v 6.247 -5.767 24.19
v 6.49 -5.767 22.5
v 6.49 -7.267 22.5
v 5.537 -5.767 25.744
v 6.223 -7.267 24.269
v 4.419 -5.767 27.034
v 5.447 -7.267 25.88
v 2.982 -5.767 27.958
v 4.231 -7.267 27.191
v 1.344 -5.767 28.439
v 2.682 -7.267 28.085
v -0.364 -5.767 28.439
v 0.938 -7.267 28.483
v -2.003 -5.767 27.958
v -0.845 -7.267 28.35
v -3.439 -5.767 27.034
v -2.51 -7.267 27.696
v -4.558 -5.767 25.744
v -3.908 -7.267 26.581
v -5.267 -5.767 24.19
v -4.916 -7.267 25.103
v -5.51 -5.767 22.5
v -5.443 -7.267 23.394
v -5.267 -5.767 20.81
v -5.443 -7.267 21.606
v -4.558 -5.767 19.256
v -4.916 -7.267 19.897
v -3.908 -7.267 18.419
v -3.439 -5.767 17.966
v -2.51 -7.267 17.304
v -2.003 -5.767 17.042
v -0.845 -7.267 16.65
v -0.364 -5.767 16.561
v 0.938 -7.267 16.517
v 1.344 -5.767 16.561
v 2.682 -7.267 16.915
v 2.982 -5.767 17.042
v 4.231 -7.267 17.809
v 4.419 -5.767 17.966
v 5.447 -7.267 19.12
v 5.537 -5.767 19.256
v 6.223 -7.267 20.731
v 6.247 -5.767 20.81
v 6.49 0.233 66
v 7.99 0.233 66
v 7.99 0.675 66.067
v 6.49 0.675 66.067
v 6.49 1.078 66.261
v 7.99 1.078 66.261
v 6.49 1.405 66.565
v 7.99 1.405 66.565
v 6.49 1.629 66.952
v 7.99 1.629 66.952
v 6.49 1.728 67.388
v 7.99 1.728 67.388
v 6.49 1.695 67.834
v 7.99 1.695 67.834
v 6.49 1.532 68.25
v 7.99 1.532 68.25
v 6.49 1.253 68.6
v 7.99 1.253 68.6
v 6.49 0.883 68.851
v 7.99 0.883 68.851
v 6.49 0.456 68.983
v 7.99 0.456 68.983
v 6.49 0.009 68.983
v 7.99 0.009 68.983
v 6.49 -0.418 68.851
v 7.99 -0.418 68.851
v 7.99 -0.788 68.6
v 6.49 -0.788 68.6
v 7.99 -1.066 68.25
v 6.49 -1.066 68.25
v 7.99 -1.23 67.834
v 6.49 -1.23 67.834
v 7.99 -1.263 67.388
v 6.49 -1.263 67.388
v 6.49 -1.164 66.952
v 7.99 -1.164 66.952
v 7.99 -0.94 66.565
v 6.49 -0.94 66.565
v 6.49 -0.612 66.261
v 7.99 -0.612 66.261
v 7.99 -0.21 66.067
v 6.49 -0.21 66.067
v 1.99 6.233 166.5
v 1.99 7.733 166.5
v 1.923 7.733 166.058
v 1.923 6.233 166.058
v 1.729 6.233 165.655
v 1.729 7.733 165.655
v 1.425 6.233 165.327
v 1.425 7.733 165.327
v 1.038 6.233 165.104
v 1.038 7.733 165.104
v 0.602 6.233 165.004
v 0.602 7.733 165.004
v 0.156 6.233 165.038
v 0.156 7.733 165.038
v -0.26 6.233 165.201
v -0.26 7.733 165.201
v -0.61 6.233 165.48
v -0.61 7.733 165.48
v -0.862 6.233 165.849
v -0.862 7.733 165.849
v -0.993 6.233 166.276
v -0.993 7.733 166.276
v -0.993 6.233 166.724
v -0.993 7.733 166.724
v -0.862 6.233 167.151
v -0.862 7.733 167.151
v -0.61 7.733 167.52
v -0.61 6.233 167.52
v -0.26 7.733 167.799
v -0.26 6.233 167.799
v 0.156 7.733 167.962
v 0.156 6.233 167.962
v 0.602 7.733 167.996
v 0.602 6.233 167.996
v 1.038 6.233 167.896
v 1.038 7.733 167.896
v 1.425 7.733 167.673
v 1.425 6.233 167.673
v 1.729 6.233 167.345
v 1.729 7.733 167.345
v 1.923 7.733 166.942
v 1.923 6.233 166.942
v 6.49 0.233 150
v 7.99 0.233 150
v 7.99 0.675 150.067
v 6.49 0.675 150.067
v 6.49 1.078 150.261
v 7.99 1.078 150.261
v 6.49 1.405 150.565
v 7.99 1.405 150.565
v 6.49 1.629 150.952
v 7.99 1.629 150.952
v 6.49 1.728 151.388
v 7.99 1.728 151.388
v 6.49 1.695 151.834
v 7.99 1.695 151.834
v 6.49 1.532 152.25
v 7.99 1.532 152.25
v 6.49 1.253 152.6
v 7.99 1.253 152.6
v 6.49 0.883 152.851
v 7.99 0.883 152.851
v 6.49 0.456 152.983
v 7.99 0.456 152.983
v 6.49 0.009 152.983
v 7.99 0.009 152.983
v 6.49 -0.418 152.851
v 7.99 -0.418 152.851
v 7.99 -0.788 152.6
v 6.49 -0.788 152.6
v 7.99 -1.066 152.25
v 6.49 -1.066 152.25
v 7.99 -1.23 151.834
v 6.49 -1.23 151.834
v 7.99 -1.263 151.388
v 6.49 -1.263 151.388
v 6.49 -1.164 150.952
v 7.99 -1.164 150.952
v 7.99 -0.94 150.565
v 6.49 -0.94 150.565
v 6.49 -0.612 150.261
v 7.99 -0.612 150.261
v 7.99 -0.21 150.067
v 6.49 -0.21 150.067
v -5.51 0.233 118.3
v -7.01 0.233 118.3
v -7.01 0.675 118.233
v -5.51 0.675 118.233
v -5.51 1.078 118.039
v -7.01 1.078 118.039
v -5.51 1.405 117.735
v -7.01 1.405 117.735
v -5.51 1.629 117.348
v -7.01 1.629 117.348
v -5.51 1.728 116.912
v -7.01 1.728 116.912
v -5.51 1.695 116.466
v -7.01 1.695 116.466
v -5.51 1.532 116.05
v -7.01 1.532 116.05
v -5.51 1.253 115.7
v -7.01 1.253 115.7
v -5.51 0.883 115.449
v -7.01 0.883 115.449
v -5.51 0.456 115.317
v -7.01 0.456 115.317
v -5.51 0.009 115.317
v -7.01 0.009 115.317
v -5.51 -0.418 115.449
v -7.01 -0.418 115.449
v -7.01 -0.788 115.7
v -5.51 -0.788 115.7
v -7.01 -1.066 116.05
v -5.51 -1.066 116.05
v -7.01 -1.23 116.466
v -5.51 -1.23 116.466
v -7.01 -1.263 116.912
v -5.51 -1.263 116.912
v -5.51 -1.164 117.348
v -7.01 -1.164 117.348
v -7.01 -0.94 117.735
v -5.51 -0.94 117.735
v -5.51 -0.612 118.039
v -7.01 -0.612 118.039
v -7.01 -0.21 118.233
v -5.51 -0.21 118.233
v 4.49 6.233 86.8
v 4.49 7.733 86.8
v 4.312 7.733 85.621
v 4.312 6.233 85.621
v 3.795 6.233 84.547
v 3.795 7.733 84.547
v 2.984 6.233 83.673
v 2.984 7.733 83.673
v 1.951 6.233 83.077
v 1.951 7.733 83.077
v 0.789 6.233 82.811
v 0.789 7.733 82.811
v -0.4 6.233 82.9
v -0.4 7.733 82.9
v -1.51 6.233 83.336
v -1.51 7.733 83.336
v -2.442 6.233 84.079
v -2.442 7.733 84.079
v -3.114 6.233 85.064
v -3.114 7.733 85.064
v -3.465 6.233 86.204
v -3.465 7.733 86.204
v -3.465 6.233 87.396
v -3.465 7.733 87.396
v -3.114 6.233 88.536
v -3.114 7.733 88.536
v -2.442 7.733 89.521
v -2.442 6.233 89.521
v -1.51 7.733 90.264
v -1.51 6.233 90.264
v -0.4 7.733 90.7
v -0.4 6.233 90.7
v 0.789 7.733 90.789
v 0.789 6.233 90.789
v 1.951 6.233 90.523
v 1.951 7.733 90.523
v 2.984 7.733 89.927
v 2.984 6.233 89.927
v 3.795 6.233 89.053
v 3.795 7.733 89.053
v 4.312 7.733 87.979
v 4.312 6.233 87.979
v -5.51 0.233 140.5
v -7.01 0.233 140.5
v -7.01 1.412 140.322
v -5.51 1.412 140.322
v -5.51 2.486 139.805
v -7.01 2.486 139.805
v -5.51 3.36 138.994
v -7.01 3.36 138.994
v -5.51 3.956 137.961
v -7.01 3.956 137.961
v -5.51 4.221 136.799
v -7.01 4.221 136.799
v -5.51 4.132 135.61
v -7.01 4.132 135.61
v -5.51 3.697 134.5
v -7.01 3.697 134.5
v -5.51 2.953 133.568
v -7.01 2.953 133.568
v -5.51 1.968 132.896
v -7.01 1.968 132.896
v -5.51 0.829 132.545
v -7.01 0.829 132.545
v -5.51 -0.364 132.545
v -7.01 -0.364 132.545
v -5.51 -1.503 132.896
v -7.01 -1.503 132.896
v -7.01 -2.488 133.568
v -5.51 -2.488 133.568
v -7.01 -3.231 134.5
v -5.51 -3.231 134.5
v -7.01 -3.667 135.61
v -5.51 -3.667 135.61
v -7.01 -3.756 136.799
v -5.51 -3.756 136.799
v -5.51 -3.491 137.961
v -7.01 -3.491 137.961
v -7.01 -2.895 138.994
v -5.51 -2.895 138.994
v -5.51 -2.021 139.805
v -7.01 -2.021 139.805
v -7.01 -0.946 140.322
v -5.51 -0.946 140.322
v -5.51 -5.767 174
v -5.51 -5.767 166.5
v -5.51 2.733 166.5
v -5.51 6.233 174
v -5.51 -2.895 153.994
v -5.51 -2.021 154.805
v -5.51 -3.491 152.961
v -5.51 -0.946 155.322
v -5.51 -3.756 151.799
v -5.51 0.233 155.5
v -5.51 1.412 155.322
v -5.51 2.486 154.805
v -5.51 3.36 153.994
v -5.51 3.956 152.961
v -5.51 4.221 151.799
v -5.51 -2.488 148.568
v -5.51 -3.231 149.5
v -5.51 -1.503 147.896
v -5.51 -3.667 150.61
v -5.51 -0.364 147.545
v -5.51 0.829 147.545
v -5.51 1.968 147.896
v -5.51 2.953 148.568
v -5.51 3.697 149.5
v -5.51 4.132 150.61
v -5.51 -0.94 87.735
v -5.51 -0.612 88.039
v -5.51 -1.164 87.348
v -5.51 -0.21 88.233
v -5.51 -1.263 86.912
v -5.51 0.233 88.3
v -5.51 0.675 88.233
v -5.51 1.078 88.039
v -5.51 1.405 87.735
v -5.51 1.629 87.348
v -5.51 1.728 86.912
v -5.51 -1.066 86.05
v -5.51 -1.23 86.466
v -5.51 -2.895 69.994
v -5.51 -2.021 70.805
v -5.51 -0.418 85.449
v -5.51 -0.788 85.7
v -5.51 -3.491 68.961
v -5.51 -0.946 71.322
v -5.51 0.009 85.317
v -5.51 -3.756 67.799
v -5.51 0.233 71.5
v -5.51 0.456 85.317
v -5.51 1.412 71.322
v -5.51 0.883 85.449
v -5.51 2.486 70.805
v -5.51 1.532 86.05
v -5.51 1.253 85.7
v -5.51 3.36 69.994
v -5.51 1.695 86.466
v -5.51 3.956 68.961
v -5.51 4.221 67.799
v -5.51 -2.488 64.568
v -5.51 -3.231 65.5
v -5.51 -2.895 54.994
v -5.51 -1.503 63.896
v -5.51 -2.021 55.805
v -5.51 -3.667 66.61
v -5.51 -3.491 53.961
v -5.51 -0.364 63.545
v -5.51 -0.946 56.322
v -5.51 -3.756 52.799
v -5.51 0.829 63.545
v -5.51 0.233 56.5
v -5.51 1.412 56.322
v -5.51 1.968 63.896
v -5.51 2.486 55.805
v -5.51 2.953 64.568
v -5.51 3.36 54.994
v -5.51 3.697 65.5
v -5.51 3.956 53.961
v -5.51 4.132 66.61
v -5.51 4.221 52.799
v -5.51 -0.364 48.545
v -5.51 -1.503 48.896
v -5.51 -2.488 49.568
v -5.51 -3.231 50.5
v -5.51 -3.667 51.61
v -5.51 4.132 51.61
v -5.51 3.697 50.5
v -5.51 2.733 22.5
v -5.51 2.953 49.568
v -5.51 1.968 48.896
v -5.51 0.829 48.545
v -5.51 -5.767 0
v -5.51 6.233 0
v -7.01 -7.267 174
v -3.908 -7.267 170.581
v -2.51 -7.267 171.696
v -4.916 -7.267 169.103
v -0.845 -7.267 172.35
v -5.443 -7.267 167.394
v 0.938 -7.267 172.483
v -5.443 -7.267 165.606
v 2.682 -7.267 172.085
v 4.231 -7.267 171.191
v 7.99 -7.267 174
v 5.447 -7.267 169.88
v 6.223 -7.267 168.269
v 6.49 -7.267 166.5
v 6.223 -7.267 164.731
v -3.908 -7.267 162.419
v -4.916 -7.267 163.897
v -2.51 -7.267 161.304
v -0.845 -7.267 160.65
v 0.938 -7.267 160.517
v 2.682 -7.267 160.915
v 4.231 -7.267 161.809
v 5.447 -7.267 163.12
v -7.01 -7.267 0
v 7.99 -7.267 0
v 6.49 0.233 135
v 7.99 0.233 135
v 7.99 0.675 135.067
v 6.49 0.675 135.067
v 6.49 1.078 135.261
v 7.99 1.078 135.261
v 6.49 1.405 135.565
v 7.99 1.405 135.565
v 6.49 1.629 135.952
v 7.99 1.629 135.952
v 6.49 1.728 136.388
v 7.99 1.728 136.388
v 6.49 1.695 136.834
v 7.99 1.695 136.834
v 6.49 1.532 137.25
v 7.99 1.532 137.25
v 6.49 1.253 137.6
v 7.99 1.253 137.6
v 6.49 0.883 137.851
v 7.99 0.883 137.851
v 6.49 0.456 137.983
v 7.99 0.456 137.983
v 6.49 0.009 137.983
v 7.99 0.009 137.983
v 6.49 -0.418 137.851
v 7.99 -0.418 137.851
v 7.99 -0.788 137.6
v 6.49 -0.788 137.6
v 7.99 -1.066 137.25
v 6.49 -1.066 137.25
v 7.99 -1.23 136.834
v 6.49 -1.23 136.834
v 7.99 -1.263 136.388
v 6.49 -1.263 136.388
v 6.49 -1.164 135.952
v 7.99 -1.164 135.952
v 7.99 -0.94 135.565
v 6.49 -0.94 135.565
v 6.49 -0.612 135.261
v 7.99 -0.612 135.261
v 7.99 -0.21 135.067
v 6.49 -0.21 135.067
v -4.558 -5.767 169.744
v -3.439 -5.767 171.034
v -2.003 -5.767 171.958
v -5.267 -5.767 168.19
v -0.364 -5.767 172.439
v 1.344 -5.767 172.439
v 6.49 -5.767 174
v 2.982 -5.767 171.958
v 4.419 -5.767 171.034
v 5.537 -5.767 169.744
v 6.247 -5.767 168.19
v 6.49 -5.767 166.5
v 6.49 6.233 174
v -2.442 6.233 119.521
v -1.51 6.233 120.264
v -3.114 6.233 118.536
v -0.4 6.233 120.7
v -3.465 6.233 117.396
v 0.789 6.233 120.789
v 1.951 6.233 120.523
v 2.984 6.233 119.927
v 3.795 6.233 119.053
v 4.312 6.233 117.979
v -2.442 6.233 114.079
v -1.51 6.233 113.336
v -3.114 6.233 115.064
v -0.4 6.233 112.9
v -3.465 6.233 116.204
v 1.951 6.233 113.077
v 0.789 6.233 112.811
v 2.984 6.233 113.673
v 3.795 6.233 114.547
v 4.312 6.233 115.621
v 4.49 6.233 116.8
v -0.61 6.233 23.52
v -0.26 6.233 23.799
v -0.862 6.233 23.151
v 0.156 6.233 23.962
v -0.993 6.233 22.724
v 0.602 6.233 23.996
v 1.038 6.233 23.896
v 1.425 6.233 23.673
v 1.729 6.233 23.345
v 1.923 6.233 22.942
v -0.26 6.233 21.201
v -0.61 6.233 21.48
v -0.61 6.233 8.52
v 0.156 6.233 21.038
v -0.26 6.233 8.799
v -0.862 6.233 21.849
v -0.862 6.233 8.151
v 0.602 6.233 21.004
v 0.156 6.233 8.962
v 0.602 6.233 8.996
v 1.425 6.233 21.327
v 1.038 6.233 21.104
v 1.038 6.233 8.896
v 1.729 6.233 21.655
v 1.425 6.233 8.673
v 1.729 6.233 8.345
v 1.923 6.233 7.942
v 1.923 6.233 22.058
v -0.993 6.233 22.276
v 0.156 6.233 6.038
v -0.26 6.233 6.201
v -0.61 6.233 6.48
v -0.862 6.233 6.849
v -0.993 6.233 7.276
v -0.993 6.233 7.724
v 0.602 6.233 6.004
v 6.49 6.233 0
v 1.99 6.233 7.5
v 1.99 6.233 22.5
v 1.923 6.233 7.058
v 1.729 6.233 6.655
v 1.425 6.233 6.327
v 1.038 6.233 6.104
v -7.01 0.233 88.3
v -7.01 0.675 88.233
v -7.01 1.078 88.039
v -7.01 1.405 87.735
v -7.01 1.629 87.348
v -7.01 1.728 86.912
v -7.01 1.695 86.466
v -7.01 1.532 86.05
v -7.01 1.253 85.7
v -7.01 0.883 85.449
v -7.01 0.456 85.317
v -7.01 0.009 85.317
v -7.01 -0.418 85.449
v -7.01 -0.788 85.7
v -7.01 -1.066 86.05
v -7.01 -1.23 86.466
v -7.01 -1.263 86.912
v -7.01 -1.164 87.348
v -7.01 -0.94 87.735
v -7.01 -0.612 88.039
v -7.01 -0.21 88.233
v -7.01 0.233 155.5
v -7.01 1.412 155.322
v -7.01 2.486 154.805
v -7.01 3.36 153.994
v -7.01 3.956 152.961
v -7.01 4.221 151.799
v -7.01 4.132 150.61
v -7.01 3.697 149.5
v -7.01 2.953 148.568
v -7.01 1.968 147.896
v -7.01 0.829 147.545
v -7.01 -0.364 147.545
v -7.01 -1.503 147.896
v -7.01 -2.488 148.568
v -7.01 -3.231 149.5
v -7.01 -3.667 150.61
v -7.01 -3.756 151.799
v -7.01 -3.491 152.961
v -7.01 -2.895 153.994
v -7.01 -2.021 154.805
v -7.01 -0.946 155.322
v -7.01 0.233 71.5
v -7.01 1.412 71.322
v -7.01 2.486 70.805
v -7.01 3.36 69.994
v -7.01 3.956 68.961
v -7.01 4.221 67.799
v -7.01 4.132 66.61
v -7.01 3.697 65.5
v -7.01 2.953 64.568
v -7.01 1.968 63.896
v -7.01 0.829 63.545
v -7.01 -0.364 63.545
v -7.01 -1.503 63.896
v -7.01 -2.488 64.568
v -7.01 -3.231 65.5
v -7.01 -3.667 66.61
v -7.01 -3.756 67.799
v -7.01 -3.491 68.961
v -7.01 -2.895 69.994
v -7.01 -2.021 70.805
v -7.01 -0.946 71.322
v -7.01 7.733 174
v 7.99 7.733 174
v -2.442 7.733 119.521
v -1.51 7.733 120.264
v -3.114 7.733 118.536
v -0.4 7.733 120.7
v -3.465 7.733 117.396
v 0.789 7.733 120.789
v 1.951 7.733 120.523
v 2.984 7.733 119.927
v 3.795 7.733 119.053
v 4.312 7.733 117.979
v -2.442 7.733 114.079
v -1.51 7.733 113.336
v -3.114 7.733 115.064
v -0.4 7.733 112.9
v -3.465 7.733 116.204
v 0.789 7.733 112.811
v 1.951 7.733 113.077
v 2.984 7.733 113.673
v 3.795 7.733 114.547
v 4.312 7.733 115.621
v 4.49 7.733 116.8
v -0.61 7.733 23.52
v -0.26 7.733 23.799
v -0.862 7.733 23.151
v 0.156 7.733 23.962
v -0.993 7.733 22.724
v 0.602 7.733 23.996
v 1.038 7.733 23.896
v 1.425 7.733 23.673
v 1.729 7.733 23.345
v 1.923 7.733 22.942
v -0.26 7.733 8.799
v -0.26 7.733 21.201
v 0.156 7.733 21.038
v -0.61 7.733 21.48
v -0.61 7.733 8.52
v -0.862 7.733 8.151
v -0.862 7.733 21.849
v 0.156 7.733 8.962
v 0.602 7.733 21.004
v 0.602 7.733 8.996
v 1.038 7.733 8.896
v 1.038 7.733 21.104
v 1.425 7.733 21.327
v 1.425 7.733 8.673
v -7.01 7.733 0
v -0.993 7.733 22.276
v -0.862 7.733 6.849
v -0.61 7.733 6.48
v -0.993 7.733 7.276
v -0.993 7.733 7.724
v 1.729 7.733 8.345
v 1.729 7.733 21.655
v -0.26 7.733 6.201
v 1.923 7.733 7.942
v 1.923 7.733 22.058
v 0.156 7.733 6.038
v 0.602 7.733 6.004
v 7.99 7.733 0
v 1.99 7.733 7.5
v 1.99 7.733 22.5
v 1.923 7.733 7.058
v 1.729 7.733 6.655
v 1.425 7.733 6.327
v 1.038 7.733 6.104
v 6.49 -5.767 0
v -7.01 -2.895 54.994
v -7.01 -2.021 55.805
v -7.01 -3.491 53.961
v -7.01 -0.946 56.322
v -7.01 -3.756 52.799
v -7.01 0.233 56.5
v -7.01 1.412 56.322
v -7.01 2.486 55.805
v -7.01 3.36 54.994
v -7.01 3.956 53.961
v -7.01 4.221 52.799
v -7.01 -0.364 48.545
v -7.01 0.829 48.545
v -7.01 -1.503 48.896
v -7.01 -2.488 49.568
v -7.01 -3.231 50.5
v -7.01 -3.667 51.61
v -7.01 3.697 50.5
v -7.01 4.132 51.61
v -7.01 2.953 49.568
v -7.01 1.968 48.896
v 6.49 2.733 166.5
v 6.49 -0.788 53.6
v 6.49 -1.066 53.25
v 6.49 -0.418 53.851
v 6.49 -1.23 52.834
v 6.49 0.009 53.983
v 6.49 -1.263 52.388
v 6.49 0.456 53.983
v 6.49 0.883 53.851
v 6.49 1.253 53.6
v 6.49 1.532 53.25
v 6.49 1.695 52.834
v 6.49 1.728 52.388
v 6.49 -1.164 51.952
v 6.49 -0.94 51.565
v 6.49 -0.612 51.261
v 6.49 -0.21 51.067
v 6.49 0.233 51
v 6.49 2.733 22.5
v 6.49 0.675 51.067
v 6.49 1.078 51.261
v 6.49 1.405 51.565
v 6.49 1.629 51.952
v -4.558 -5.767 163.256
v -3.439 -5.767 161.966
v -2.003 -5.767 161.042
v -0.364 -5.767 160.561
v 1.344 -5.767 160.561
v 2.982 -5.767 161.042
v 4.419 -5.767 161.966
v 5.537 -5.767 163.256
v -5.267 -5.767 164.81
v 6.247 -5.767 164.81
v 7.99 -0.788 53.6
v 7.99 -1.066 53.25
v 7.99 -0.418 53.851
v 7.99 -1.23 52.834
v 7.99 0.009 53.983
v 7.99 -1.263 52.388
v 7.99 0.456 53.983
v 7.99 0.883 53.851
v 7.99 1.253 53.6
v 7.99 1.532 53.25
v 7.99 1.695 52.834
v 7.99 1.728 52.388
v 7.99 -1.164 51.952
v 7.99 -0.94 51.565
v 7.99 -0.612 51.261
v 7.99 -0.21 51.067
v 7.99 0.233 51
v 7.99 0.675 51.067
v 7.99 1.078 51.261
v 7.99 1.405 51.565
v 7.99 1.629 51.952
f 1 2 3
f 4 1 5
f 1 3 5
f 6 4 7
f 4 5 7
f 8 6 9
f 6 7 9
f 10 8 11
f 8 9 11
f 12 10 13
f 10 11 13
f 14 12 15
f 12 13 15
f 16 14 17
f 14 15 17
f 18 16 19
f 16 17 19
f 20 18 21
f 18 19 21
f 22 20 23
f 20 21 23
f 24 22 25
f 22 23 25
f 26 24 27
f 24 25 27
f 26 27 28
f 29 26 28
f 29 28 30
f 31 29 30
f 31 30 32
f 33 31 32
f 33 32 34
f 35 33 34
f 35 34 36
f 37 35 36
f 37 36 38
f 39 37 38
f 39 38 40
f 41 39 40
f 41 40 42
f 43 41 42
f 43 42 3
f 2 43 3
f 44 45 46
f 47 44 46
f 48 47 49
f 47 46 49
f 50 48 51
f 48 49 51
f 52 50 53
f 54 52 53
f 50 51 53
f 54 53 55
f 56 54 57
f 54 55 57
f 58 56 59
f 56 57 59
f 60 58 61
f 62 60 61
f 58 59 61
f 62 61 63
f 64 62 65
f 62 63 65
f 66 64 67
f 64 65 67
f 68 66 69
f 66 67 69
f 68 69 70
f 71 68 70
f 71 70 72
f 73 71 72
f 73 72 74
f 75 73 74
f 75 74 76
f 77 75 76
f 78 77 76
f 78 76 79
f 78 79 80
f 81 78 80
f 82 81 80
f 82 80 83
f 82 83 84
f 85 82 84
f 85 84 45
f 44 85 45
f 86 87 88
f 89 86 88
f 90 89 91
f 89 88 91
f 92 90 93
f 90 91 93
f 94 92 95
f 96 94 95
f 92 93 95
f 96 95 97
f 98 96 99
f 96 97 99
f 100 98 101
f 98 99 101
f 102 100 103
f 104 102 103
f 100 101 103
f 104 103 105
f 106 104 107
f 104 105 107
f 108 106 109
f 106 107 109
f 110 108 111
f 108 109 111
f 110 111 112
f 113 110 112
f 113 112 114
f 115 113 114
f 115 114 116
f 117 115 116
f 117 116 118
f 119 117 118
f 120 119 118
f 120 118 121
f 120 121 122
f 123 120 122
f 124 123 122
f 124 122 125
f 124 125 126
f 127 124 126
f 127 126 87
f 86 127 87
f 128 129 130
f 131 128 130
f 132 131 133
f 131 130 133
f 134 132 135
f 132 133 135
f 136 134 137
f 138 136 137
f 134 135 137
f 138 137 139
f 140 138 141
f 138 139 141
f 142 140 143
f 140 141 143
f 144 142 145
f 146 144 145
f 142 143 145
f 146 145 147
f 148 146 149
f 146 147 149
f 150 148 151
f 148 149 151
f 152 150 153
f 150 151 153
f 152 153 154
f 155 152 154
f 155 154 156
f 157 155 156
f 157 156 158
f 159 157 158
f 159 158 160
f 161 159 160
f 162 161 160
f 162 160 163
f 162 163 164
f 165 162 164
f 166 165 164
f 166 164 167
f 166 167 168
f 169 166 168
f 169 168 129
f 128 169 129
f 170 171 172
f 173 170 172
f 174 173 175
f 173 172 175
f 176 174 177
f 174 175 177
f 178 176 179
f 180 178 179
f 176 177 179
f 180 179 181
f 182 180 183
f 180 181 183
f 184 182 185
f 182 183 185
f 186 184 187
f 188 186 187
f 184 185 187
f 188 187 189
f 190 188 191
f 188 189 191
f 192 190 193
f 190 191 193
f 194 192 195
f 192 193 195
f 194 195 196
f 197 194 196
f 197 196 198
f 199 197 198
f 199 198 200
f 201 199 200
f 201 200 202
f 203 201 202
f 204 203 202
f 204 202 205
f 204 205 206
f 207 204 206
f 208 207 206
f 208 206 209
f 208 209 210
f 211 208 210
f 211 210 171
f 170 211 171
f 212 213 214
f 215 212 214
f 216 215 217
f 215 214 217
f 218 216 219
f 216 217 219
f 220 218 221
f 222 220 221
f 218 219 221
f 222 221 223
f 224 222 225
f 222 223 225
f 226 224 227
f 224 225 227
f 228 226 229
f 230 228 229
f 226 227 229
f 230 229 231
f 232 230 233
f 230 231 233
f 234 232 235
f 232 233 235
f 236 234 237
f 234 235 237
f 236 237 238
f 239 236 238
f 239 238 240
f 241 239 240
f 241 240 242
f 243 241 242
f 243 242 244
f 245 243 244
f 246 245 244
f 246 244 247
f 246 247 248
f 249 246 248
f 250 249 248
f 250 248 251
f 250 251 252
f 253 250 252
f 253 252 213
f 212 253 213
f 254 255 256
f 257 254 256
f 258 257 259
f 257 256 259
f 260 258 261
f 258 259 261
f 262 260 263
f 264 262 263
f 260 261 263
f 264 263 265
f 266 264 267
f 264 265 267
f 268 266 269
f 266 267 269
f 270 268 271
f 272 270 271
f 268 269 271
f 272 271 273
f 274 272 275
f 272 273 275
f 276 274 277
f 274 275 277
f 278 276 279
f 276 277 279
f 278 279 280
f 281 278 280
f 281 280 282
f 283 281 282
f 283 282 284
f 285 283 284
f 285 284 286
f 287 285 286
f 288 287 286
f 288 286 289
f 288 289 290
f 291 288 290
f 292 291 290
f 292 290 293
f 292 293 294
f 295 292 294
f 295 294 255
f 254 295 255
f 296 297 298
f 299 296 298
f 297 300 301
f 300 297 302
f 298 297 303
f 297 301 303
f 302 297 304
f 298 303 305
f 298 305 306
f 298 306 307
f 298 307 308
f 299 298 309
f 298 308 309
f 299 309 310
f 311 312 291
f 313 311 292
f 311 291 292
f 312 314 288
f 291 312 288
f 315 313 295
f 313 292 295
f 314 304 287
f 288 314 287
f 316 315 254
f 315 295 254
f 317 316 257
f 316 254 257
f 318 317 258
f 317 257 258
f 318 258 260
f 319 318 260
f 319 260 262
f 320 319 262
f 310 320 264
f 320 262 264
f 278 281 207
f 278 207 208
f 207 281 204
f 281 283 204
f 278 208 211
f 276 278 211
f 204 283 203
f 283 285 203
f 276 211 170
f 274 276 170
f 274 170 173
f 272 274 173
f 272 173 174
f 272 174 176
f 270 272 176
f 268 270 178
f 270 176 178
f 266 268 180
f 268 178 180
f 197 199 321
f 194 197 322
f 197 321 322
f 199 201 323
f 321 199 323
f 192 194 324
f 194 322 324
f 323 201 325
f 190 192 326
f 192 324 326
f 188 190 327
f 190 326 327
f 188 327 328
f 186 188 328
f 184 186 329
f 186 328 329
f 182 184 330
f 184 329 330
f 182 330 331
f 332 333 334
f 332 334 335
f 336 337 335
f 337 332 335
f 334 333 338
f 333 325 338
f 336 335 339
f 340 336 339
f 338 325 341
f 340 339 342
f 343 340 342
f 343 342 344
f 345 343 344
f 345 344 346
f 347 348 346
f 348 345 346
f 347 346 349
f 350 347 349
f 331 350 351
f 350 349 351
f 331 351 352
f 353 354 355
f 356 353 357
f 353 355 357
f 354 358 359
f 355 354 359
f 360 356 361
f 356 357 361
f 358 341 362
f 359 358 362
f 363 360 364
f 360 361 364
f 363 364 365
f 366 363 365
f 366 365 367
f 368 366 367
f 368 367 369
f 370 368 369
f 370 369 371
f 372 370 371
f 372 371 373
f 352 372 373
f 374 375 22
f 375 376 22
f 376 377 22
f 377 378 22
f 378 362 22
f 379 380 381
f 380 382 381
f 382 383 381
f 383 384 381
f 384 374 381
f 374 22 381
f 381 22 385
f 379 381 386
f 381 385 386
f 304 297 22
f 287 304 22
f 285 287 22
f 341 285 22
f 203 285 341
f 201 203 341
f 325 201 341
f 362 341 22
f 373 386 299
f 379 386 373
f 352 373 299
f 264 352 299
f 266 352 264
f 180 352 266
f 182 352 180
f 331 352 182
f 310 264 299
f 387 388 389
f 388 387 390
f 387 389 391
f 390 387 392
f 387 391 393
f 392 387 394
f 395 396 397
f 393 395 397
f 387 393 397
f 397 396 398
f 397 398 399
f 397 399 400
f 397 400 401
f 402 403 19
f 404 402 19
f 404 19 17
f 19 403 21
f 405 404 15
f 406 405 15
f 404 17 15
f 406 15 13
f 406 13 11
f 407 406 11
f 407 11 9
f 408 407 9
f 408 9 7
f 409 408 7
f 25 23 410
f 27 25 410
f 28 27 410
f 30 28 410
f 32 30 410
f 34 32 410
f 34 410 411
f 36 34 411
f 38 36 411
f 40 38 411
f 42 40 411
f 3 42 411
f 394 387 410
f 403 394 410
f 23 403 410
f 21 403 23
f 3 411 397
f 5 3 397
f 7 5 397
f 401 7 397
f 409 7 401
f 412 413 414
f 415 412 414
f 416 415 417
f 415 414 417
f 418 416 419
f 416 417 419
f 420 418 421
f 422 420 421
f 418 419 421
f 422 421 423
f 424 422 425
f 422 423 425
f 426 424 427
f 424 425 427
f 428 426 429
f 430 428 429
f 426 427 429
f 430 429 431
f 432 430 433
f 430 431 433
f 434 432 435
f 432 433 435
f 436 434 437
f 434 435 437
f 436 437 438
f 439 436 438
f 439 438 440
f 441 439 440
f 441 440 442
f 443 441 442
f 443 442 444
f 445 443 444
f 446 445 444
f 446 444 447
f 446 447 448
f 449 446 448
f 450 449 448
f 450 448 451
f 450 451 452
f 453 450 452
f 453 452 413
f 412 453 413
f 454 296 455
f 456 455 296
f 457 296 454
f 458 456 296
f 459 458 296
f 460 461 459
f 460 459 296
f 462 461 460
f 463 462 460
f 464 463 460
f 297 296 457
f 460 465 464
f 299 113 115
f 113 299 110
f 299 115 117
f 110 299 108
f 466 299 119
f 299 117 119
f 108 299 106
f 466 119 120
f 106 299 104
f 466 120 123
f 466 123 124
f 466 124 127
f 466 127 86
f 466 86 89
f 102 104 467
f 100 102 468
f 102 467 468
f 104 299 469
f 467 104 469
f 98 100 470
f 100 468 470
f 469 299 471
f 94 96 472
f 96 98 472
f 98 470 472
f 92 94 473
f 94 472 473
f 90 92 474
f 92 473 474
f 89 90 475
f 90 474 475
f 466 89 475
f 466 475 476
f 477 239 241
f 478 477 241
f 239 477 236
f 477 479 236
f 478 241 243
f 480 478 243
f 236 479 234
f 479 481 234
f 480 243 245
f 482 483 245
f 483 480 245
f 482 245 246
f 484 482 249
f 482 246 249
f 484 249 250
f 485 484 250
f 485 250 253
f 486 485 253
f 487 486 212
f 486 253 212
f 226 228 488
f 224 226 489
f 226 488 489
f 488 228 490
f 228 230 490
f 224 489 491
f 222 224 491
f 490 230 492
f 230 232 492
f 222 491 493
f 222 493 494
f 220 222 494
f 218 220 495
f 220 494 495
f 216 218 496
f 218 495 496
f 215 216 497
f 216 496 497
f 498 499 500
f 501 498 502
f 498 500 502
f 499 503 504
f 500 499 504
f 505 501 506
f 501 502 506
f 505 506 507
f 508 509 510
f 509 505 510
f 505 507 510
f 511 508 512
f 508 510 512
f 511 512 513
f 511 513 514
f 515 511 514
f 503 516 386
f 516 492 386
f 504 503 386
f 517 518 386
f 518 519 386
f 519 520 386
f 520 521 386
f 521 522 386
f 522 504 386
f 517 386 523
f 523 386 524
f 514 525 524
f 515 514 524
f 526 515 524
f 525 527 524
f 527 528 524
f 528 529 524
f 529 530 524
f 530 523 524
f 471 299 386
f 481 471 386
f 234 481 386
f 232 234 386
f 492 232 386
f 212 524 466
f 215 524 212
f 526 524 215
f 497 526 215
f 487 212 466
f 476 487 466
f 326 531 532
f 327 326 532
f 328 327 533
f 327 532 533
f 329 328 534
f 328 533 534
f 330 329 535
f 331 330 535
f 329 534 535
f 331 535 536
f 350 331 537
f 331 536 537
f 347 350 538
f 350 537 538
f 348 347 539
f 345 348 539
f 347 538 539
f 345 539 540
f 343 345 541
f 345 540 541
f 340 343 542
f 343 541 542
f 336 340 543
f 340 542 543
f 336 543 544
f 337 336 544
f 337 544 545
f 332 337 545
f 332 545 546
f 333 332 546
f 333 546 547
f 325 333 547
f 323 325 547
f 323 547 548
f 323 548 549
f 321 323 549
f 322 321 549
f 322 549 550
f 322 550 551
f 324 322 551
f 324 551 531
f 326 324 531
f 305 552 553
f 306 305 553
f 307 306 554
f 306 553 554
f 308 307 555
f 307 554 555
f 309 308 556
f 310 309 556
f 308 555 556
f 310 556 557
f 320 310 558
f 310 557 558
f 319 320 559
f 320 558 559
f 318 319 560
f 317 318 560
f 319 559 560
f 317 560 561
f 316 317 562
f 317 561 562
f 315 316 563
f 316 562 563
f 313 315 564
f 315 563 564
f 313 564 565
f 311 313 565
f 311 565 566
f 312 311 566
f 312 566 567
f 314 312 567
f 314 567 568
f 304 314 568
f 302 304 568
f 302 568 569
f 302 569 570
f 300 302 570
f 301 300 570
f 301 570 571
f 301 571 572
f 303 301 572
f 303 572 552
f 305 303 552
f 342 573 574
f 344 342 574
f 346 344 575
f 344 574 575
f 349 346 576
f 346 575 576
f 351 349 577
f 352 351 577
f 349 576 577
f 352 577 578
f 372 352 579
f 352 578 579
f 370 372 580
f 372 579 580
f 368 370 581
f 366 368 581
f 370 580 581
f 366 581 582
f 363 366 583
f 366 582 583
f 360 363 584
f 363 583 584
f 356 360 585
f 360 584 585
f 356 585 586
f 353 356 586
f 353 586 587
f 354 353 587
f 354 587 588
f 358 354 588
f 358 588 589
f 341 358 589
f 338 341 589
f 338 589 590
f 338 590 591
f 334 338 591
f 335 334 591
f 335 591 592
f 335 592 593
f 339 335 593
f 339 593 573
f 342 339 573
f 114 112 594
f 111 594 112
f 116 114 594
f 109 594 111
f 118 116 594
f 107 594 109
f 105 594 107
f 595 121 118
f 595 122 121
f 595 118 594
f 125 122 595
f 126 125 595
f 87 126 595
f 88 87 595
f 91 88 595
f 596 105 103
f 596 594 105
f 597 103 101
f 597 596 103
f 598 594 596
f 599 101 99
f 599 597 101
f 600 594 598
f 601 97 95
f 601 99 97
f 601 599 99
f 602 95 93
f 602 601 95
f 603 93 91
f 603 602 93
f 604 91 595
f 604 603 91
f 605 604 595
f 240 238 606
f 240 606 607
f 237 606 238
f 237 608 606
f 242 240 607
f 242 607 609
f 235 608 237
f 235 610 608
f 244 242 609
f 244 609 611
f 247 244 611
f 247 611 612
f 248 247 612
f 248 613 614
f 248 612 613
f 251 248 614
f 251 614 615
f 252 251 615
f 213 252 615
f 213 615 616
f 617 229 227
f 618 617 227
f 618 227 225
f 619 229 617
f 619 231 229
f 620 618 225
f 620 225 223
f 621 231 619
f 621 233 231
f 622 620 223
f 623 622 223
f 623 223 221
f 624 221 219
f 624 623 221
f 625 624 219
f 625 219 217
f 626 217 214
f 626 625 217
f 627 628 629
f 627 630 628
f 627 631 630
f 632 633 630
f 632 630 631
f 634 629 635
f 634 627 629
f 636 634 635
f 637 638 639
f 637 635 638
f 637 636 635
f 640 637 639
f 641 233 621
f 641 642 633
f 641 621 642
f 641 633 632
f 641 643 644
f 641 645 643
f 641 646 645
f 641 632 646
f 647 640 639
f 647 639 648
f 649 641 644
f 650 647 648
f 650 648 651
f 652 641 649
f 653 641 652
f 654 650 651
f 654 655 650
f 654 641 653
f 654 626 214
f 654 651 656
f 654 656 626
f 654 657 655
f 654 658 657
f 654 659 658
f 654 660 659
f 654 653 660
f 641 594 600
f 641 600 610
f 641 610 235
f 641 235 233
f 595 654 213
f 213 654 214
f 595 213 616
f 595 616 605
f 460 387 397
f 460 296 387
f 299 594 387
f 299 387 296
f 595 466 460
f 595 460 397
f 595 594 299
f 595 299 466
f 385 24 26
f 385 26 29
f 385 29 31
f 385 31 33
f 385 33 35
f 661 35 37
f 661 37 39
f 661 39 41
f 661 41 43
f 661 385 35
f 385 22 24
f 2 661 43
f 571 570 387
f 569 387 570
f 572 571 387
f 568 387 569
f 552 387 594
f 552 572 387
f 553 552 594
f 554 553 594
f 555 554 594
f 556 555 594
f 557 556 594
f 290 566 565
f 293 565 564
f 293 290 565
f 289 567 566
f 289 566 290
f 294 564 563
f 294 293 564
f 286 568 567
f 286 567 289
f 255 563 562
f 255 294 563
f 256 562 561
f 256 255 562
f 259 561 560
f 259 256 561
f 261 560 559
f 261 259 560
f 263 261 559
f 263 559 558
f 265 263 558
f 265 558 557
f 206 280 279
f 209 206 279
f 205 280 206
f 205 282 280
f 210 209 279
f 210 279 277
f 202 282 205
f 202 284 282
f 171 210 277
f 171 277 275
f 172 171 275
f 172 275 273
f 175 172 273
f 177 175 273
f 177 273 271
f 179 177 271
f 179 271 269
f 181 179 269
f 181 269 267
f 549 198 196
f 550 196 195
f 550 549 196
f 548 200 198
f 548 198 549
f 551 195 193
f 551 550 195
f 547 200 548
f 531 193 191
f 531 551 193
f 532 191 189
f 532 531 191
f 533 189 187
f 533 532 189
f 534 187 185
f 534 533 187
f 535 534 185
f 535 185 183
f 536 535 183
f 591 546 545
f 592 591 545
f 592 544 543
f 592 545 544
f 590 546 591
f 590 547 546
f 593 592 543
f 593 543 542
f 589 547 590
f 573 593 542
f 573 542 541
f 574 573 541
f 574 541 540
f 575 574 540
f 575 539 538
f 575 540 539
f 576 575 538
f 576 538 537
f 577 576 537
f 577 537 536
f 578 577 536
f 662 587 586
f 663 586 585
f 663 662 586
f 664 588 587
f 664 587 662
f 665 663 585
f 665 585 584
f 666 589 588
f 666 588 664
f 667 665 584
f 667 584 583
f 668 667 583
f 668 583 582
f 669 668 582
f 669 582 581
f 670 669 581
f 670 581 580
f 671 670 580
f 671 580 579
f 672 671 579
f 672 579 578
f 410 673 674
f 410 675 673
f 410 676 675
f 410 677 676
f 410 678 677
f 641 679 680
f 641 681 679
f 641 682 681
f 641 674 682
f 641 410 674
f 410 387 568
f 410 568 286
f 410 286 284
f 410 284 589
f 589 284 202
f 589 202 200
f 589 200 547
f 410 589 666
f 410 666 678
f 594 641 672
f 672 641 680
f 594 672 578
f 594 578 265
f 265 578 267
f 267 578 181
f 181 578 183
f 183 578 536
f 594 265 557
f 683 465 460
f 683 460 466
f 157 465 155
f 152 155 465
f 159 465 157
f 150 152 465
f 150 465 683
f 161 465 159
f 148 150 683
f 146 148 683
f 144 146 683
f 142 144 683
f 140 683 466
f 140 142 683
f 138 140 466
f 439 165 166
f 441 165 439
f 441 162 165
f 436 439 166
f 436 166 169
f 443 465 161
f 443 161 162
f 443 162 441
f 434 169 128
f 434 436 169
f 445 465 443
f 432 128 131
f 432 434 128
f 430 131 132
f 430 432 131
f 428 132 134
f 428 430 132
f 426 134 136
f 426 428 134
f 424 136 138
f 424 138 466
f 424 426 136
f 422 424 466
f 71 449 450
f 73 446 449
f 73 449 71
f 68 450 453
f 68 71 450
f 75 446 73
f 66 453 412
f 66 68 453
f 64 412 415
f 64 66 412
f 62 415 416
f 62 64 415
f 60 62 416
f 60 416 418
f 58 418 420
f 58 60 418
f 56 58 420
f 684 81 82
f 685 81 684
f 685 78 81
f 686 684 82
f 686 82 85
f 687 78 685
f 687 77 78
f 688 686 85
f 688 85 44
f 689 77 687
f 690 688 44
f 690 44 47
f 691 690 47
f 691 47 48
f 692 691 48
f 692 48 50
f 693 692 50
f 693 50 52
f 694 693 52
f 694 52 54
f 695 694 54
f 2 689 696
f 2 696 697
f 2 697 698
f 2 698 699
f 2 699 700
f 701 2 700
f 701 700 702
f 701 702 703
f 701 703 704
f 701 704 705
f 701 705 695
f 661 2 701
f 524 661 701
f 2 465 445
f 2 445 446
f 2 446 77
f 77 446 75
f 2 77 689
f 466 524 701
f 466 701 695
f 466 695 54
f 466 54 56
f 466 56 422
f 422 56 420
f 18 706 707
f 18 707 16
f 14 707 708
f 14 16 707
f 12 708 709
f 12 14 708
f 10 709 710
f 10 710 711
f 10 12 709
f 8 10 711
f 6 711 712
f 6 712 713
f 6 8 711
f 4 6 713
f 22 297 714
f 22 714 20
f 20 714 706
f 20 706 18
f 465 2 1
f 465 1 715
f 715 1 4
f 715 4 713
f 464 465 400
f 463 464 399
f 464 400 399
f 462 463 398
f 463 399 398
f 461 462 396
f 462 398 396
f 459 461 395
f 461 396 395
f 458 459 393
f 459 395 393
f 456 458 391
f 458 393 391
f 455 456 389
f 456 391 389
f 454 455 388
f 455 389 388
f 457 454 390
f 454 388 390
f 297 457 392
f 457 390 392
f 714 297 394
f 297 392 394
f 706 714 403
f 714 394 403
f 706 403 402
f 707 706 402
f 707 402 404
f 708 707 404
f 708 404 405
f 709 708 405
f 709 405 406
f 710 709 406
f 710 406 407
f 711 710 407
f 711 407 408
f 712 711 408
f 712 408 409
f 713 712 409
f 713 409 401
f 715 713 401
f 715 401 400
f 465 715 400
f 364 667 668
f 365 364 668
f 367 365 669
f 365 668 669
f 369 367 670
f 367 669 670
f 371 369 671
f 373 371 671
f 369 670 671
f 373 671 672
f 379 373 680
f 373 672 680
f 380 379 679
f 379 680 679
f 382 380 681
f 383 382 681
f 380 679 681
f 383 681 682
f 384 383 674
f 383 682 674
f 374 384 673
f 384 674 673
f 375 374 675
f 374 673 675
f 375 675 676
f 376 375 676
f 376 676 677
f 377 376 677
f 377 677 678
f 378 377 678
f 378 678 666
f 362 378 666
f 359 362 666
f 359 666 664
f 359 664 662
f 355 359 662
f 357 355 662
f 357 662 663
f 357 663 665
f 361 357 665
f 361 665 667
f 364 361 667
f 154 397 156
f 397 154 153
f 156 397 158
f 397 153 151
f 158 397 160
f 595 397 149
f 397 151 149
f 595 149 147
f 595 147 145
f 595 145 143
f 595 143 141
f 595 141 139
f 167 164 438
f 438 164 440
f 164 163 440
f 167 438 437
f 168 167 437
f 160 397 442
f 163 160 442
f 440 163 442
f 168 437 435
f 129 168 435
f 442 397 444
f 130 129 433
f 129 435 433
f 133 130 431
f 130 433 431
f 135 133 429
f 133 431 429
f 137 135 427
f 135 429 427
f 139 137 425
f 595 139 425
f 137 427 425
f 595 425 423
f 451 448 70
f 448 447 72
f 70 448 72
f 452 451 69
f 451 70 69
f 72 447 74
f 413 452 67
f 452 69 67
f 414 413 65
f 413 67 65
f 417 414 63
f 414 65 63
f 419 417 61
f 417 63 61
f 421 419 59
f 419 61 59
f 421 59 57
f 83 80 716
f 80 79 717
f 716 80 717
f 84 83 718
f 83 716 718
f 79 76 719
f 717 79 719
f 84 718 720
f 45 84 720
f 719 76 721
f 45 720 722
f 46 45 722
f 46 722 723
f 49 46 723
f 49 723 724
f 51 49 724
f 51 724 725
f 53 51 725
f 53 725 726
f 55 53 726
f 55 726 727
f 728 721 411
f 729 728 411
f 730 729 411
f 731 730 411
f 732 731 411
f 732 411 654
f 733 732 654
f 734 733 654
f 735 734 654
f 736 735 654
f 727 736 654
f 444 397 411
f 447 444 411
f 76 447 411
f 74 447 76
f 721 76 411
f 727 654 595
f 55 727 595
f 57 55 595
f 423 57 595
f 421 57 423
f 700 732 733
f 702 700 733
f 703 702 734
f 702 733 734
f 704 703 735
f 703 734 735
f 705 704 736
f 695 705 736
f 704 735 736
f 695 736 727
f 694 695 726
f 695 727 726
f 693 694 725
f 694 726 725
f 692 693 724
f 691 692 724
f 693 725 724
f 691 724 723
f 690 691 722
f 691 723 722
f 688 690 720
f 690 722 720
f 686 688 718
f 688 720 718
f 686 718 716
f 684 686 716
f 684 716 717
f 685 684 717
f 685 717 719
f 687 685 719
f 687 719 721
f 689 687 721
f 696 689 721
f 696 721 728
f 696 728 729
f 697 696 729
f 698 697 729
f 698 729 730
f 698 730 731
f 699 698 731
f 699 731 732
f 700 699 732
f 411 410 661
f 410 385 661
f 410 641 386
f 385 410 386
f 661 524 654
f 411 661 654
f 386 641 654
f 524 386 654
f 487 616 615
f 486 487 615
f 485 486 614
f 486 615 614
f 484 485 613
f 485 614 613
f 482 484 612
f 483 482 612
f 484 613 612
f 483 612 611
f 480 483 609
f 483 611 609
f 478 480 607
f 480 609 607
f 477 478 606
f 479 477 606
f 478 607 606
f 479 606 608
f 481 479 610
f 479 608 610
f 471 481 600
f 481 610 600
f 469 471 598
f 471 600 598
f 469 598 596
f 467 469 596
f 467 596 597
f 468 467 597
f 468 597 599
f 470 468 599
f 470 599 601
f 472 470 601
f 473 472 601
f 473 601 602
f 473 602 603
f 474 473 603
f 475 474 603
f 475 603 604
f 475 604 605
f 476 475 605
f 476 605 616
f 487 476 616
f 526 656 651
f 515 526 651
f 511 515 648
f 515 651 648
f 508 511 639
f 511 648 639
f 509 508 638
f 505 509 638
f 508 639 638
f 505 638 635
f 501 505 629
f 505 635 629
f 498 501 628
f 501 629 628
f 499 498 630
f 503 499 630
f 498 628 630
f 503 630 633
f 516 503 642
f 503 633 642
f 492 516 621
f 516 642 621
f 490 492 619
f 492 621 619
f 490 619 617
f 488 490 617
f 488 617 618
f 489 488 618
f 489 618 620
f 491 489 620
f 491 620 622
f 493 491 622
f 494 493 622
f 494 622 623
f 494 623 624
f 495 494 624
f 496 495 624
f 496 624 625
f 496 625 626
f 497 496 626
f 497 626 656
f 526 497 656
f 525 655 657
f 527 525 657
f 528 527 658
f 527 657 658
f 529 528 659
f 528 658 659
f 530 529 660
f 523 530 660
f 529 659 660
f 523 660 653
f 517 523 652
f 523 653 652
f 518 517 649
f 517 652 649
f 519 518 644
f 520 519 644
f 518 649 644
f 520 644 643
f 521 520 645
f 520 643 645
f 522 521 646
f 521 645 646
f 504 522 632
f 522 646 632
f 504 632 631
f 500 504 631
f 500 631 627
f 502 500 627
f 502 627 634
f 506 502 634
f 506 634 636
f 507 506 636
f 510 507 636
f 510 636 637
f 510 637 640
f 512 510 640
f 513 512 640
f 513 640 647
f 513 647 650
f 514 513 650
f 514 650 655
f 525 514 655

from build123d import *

# Parameters (mm, degrees)
SKETCH_1_W           = 15
SKETCH_1_H           = 15
SKETCH_1_W_2         = 12
SKETCH_1_H_2         = 12
EXTRUDE_2_DEPTH      = 174
SKETCH_3_R           = 1.5
CUT_EXTRUDE_2_DEPTH  = 10
SKETCH_6_R           = 4
CUT_EXTRUDE_4_DEPTH  = 10
SKETCH_7_R           = 1.5
CUT_EXTRUDE_5_DEPTH  = 10
SKETCH_8_R           = 4
CUT_EXTRUDE_6_DEPTH  = 10
SKETCH_10_R          = 1.5
CUT_EXTRUDE_9_DEPTH  = 10
SKETCH_13_R          = 1.5
CUT_EXTRUDE_11_DEPTH = 10
SKETCH_16_R          = 1.5
CUT_EXTRUDE_14_DEPTH = 10
SKETCH_17_R          = 6
CUT_EXTRUDE_15_DEPTH = 10
SKETCH_18_R          = 1.5
CUT_EXTRUDE_16_DEPTH = 10
SKETCH_19_R          = 4
CUT_EXTRUDE_17_DEPTH = 10
SKETCH_20_R          = 1.5
CUT_EXTRUDE_18_DEPTH = 10
SKETCH_21_R          = 1.5
CUT_EXTRUDE_19_DEPTH = 10
SKETCH_22_R          = 4
CUT_EXTRUDE_20_DEPTH = 10
SKETCH_23_R          = 1.5
CUT_EXTRUDE_21_DEPTH = 10
SKETCH_24_R          = 4
CUT_EXTRUDE_22_DEPTH = 10
SKETCH_25_R          = 4
CUT_EXTRUDE_23_DEPTH = 10
SKETCH_26_R          = 6
CUT_EXTRUDE_24_DEPTH = 10


with BuildPart() as part:
    # ｽｹｯﾁ1 → ﾎﾞｽ - 押し出し2 (new body)
    with BuildSketch(Plane.XY):
        with Locations((0.489915859, 0.232626086)):
            Rectangle(SKETCH_1_W, SKETCH_1_H)
        with Locations((0.489915859, 0.232626086)):
            Rectangle(SKETCH_1_W_2, SKETCH_1_H_2, mode=Mode.SUBTRACT)
    extrude(amount=EXTRUDE_2_DEPTH)

    # ｽｹｯﾁ3 → ｶｯﾄ - 押し出し2 (cut)
    with BuildSketch(Plane(origin=(7.989915859, 0, 0), x_dir=(0, 0, -1), z_dir=(1, 0, 0))):
        with Locations((-52.5, 0.232626086)):
            Circle(SKETCH_3_R)
    extrude(amount=-CUT_EXTRUDE_2_DEPTH, mode=Mode.SUBTRACT)

    # ｽｹｯﾁ6 → ｶｯﾄ - 押し出し4 (cut)
    with BuildSketch(Plane.ZY.offset(7.010084141)):
        with Locations((52.5, 0.232626086)):
            Circle(SKETCH_6_R)
    extrude(amount=-CUT_EXTRUDE_4_DEPTH, mode=Mode.SUBTRACT)

    # ｽｹｯﾁ7 → ｶｯﾄ - 押し出し5 (cut)
    with BuildSketch(Plane(origin=(7.989915859, 0, 0), x_dir=(0, 0, -1), z_dir=(1, 0, 0))):
        with Locations((-151.5, 0.232626086)):
            Circle(SKETCH_7_R)
    extrude(amount=-CUT_EXTRUDE_5_DEPTH, mode=Mode.SUBTRACT)

    # ｽｹｯﾁ8 → ｶｯﾄ - 押し出し6 (cut)
    with BuildSketch(Plane.ZY.offset(7.010084141)):
        with Locations((151.5, 0.232626086)):
            Circle(SKETCH_8_R)
    extrude(amount=-CUT_EXTRUDE_6_DEPTH, mode=Mode.SUBTRACT)

    # ｽｹｯﾁ10 → ｶｯﾄ - 押し出し9 (cut)
    with BuildSketch(Plane.ZY.offset(7.010084141)):
        with Locations((86.8, 0.232626086)):
            Circle(SKETCH_10_R)
    extrude(amount=-CUT_EXTRUDE_9_DEPTH, mode=Mode.SUBTRACT)

    # ｽｹｯﾁ13 → ｶｯﾄ - 押し出し11 (cut)
    with BuildSketch(Plane.ZY.offset(7.010084141)):
        with Locations((116.8, 0.232626086)):
            Circle(SKETCH_13_R)
    extrude(amount=-CUT_EXTRUDE_11_DEPTH, mode=Mode.SUBTRACT)

    # ｽｹｯﾁ16 → ｶｯﾄ - 押し出し14 (cut)
    with BuildSketch(Plane(origin=(0, 7.732626086, 0), x_dir=(1, 0, 0), z_dir=(0, 1, 0))):
        with Locations((0.489915859, -22.5)):
            Circle(SKETCH_16_R)
    extrude(amount=-CUT_EXTRUDE_14_DEPTH, mode=Mode.SUBTRACT)

    # ｽｹｯﾁ17 → ｶｯﾄ - 押し出し15 (cut)
    with BuildSketch(Plane.XZ.offset(7.267373914)):
        with Locations((0.489915859, 166.5)):
            Circle(SKETCH_17_R)
    extrude(amount=-CUT_EXTRUDE_15_DEPTH, mode=Mode.SUBTRACT)

    # ｽｹｯﾁ18 → ｶｯﾄ - 押し出し16 (cut)
    with BuildSketch(Plane(origin=(0, 7.732626086, 0), x_dir=(1, 0, 0), z_dir=(0, 1, 0))):
        with Locations((0.489915859, -166.5)):
            Circle(SKETCH_18_R)
    extrude(amount=-CUT_EXTRUDE_16_DEPTH, mode=Mode.SUBTRACT)

    # ｽｹｯﾁ19 → ｶｯﾄ - 押し出し17 (cut)
    with BuildSketch(Plane.ZY.offset(7.010084141)):
        with Locations((67.5, 0.232626086)):
            Circle(SKETCH_19_R)
    extrude(amount=-CUT_EXTRUDE_17_DEPTH, mode=Mode.SUBTRACT)

    # ｽｹｯﾁ20 → ｶｯﾄ - 押し出し18 (cut)
    with BuildSketch(Plane(origin=(7.989915859, 0, 0), x_dir=(0, 0, -1), z_dir=(1, 0, 0))):
        with Locations((-67.5, 0.232626086)):
            Circle(SKETCH_20_R)
    extrude(amount=-CUT_EXTRUDE_18_DEPTH, mode=Mode.SUBTRACT)

    # ｽｹｯﾁ21 → ｶｯﾄ - 押し出し19 (cut)
    with BuildSketch(Plane(origin=(7.989915859, 0, 0), x_dir=(0, 0, -1), z_dir=(1, 0, 0))):
        with Locations((-136.5, 0.232626086)):
            Circle(SKETCH_21_R)
    extrude(amount=-CUT_EXTRUDE_19_DEPTH, mode=Mode.SUBTRACT)

    # ｽｹｯﾁ22 → ｶｯﾄ - 押し出し20 (cut)
    with BuildSketch(Plane.ZY.offset(7.010084141)):
        with Locations((136.5, 0.232626086)):
            Circle(SKETCH_22_R)
    extrude(amount=-CUT_EXTRUDE_20_DEPTH, mode=Mode.SUBTRACT)

    # ｽｹｯﾁ23 → ｶｯﾄ - 押し出し21 (cut)
    with BuildSketch(Plane(origin=(0, 7.732626086, 0), x_dir=(1, 0, 0), z_dir=(0, 1, 0))):
        with Locations((0.489915859, -7.5)):
            Circle(SKETCH_23_R)
    extrude(amount=-CUT_EXTRUDE_21_DEPTH, mode=Mode.SUBTRACT)

    # ｽｹｯﾁ24 → ｶｯﾄ - 押し出し22 (cut)
    with BuildSketch(Plane(origin=(0, 7.732626086, 0), x_dir=(1, 0, 0), z_dir=(0, 1, 0))):
        with Locations((0.489915859, -86.8)):
            Circle(SKETCH_24_R)
    extrude(amount=-CUT_EXTRUDE_22_DEPTH, mode=Mode.SUBTRACT)

    # ｽｹｯﾁ25 → ｶｯﾄ - 押し出し23 (cut)
    with BuildSketch(Plane(origin=(0, 7.732626086, 0), x_dir=(1, 0, 0), z_dir=(0, 1, 0))):
        with Locations((0.489915859, -116.8)):
            Circle(SKETCH_25_R)
    extrude(amount=-CUT_EXTRUDE_23_DEPTH, mode=Mode.SUBTRACT)

    # ｽｹｯﾁ26 → ｶｯﾄ - 押し出し24 (cut)
    with BuildSketch(Plane.XZ.offset(7.267373914)):
        with Locations((0.489915859, 22.5)):
            Circle(SKETCH_26_R)
    extrude(amount=-CUT_EXTRUDE_24_DEPTH, mode=Mode.SUBTRACT)


solid = part.part
